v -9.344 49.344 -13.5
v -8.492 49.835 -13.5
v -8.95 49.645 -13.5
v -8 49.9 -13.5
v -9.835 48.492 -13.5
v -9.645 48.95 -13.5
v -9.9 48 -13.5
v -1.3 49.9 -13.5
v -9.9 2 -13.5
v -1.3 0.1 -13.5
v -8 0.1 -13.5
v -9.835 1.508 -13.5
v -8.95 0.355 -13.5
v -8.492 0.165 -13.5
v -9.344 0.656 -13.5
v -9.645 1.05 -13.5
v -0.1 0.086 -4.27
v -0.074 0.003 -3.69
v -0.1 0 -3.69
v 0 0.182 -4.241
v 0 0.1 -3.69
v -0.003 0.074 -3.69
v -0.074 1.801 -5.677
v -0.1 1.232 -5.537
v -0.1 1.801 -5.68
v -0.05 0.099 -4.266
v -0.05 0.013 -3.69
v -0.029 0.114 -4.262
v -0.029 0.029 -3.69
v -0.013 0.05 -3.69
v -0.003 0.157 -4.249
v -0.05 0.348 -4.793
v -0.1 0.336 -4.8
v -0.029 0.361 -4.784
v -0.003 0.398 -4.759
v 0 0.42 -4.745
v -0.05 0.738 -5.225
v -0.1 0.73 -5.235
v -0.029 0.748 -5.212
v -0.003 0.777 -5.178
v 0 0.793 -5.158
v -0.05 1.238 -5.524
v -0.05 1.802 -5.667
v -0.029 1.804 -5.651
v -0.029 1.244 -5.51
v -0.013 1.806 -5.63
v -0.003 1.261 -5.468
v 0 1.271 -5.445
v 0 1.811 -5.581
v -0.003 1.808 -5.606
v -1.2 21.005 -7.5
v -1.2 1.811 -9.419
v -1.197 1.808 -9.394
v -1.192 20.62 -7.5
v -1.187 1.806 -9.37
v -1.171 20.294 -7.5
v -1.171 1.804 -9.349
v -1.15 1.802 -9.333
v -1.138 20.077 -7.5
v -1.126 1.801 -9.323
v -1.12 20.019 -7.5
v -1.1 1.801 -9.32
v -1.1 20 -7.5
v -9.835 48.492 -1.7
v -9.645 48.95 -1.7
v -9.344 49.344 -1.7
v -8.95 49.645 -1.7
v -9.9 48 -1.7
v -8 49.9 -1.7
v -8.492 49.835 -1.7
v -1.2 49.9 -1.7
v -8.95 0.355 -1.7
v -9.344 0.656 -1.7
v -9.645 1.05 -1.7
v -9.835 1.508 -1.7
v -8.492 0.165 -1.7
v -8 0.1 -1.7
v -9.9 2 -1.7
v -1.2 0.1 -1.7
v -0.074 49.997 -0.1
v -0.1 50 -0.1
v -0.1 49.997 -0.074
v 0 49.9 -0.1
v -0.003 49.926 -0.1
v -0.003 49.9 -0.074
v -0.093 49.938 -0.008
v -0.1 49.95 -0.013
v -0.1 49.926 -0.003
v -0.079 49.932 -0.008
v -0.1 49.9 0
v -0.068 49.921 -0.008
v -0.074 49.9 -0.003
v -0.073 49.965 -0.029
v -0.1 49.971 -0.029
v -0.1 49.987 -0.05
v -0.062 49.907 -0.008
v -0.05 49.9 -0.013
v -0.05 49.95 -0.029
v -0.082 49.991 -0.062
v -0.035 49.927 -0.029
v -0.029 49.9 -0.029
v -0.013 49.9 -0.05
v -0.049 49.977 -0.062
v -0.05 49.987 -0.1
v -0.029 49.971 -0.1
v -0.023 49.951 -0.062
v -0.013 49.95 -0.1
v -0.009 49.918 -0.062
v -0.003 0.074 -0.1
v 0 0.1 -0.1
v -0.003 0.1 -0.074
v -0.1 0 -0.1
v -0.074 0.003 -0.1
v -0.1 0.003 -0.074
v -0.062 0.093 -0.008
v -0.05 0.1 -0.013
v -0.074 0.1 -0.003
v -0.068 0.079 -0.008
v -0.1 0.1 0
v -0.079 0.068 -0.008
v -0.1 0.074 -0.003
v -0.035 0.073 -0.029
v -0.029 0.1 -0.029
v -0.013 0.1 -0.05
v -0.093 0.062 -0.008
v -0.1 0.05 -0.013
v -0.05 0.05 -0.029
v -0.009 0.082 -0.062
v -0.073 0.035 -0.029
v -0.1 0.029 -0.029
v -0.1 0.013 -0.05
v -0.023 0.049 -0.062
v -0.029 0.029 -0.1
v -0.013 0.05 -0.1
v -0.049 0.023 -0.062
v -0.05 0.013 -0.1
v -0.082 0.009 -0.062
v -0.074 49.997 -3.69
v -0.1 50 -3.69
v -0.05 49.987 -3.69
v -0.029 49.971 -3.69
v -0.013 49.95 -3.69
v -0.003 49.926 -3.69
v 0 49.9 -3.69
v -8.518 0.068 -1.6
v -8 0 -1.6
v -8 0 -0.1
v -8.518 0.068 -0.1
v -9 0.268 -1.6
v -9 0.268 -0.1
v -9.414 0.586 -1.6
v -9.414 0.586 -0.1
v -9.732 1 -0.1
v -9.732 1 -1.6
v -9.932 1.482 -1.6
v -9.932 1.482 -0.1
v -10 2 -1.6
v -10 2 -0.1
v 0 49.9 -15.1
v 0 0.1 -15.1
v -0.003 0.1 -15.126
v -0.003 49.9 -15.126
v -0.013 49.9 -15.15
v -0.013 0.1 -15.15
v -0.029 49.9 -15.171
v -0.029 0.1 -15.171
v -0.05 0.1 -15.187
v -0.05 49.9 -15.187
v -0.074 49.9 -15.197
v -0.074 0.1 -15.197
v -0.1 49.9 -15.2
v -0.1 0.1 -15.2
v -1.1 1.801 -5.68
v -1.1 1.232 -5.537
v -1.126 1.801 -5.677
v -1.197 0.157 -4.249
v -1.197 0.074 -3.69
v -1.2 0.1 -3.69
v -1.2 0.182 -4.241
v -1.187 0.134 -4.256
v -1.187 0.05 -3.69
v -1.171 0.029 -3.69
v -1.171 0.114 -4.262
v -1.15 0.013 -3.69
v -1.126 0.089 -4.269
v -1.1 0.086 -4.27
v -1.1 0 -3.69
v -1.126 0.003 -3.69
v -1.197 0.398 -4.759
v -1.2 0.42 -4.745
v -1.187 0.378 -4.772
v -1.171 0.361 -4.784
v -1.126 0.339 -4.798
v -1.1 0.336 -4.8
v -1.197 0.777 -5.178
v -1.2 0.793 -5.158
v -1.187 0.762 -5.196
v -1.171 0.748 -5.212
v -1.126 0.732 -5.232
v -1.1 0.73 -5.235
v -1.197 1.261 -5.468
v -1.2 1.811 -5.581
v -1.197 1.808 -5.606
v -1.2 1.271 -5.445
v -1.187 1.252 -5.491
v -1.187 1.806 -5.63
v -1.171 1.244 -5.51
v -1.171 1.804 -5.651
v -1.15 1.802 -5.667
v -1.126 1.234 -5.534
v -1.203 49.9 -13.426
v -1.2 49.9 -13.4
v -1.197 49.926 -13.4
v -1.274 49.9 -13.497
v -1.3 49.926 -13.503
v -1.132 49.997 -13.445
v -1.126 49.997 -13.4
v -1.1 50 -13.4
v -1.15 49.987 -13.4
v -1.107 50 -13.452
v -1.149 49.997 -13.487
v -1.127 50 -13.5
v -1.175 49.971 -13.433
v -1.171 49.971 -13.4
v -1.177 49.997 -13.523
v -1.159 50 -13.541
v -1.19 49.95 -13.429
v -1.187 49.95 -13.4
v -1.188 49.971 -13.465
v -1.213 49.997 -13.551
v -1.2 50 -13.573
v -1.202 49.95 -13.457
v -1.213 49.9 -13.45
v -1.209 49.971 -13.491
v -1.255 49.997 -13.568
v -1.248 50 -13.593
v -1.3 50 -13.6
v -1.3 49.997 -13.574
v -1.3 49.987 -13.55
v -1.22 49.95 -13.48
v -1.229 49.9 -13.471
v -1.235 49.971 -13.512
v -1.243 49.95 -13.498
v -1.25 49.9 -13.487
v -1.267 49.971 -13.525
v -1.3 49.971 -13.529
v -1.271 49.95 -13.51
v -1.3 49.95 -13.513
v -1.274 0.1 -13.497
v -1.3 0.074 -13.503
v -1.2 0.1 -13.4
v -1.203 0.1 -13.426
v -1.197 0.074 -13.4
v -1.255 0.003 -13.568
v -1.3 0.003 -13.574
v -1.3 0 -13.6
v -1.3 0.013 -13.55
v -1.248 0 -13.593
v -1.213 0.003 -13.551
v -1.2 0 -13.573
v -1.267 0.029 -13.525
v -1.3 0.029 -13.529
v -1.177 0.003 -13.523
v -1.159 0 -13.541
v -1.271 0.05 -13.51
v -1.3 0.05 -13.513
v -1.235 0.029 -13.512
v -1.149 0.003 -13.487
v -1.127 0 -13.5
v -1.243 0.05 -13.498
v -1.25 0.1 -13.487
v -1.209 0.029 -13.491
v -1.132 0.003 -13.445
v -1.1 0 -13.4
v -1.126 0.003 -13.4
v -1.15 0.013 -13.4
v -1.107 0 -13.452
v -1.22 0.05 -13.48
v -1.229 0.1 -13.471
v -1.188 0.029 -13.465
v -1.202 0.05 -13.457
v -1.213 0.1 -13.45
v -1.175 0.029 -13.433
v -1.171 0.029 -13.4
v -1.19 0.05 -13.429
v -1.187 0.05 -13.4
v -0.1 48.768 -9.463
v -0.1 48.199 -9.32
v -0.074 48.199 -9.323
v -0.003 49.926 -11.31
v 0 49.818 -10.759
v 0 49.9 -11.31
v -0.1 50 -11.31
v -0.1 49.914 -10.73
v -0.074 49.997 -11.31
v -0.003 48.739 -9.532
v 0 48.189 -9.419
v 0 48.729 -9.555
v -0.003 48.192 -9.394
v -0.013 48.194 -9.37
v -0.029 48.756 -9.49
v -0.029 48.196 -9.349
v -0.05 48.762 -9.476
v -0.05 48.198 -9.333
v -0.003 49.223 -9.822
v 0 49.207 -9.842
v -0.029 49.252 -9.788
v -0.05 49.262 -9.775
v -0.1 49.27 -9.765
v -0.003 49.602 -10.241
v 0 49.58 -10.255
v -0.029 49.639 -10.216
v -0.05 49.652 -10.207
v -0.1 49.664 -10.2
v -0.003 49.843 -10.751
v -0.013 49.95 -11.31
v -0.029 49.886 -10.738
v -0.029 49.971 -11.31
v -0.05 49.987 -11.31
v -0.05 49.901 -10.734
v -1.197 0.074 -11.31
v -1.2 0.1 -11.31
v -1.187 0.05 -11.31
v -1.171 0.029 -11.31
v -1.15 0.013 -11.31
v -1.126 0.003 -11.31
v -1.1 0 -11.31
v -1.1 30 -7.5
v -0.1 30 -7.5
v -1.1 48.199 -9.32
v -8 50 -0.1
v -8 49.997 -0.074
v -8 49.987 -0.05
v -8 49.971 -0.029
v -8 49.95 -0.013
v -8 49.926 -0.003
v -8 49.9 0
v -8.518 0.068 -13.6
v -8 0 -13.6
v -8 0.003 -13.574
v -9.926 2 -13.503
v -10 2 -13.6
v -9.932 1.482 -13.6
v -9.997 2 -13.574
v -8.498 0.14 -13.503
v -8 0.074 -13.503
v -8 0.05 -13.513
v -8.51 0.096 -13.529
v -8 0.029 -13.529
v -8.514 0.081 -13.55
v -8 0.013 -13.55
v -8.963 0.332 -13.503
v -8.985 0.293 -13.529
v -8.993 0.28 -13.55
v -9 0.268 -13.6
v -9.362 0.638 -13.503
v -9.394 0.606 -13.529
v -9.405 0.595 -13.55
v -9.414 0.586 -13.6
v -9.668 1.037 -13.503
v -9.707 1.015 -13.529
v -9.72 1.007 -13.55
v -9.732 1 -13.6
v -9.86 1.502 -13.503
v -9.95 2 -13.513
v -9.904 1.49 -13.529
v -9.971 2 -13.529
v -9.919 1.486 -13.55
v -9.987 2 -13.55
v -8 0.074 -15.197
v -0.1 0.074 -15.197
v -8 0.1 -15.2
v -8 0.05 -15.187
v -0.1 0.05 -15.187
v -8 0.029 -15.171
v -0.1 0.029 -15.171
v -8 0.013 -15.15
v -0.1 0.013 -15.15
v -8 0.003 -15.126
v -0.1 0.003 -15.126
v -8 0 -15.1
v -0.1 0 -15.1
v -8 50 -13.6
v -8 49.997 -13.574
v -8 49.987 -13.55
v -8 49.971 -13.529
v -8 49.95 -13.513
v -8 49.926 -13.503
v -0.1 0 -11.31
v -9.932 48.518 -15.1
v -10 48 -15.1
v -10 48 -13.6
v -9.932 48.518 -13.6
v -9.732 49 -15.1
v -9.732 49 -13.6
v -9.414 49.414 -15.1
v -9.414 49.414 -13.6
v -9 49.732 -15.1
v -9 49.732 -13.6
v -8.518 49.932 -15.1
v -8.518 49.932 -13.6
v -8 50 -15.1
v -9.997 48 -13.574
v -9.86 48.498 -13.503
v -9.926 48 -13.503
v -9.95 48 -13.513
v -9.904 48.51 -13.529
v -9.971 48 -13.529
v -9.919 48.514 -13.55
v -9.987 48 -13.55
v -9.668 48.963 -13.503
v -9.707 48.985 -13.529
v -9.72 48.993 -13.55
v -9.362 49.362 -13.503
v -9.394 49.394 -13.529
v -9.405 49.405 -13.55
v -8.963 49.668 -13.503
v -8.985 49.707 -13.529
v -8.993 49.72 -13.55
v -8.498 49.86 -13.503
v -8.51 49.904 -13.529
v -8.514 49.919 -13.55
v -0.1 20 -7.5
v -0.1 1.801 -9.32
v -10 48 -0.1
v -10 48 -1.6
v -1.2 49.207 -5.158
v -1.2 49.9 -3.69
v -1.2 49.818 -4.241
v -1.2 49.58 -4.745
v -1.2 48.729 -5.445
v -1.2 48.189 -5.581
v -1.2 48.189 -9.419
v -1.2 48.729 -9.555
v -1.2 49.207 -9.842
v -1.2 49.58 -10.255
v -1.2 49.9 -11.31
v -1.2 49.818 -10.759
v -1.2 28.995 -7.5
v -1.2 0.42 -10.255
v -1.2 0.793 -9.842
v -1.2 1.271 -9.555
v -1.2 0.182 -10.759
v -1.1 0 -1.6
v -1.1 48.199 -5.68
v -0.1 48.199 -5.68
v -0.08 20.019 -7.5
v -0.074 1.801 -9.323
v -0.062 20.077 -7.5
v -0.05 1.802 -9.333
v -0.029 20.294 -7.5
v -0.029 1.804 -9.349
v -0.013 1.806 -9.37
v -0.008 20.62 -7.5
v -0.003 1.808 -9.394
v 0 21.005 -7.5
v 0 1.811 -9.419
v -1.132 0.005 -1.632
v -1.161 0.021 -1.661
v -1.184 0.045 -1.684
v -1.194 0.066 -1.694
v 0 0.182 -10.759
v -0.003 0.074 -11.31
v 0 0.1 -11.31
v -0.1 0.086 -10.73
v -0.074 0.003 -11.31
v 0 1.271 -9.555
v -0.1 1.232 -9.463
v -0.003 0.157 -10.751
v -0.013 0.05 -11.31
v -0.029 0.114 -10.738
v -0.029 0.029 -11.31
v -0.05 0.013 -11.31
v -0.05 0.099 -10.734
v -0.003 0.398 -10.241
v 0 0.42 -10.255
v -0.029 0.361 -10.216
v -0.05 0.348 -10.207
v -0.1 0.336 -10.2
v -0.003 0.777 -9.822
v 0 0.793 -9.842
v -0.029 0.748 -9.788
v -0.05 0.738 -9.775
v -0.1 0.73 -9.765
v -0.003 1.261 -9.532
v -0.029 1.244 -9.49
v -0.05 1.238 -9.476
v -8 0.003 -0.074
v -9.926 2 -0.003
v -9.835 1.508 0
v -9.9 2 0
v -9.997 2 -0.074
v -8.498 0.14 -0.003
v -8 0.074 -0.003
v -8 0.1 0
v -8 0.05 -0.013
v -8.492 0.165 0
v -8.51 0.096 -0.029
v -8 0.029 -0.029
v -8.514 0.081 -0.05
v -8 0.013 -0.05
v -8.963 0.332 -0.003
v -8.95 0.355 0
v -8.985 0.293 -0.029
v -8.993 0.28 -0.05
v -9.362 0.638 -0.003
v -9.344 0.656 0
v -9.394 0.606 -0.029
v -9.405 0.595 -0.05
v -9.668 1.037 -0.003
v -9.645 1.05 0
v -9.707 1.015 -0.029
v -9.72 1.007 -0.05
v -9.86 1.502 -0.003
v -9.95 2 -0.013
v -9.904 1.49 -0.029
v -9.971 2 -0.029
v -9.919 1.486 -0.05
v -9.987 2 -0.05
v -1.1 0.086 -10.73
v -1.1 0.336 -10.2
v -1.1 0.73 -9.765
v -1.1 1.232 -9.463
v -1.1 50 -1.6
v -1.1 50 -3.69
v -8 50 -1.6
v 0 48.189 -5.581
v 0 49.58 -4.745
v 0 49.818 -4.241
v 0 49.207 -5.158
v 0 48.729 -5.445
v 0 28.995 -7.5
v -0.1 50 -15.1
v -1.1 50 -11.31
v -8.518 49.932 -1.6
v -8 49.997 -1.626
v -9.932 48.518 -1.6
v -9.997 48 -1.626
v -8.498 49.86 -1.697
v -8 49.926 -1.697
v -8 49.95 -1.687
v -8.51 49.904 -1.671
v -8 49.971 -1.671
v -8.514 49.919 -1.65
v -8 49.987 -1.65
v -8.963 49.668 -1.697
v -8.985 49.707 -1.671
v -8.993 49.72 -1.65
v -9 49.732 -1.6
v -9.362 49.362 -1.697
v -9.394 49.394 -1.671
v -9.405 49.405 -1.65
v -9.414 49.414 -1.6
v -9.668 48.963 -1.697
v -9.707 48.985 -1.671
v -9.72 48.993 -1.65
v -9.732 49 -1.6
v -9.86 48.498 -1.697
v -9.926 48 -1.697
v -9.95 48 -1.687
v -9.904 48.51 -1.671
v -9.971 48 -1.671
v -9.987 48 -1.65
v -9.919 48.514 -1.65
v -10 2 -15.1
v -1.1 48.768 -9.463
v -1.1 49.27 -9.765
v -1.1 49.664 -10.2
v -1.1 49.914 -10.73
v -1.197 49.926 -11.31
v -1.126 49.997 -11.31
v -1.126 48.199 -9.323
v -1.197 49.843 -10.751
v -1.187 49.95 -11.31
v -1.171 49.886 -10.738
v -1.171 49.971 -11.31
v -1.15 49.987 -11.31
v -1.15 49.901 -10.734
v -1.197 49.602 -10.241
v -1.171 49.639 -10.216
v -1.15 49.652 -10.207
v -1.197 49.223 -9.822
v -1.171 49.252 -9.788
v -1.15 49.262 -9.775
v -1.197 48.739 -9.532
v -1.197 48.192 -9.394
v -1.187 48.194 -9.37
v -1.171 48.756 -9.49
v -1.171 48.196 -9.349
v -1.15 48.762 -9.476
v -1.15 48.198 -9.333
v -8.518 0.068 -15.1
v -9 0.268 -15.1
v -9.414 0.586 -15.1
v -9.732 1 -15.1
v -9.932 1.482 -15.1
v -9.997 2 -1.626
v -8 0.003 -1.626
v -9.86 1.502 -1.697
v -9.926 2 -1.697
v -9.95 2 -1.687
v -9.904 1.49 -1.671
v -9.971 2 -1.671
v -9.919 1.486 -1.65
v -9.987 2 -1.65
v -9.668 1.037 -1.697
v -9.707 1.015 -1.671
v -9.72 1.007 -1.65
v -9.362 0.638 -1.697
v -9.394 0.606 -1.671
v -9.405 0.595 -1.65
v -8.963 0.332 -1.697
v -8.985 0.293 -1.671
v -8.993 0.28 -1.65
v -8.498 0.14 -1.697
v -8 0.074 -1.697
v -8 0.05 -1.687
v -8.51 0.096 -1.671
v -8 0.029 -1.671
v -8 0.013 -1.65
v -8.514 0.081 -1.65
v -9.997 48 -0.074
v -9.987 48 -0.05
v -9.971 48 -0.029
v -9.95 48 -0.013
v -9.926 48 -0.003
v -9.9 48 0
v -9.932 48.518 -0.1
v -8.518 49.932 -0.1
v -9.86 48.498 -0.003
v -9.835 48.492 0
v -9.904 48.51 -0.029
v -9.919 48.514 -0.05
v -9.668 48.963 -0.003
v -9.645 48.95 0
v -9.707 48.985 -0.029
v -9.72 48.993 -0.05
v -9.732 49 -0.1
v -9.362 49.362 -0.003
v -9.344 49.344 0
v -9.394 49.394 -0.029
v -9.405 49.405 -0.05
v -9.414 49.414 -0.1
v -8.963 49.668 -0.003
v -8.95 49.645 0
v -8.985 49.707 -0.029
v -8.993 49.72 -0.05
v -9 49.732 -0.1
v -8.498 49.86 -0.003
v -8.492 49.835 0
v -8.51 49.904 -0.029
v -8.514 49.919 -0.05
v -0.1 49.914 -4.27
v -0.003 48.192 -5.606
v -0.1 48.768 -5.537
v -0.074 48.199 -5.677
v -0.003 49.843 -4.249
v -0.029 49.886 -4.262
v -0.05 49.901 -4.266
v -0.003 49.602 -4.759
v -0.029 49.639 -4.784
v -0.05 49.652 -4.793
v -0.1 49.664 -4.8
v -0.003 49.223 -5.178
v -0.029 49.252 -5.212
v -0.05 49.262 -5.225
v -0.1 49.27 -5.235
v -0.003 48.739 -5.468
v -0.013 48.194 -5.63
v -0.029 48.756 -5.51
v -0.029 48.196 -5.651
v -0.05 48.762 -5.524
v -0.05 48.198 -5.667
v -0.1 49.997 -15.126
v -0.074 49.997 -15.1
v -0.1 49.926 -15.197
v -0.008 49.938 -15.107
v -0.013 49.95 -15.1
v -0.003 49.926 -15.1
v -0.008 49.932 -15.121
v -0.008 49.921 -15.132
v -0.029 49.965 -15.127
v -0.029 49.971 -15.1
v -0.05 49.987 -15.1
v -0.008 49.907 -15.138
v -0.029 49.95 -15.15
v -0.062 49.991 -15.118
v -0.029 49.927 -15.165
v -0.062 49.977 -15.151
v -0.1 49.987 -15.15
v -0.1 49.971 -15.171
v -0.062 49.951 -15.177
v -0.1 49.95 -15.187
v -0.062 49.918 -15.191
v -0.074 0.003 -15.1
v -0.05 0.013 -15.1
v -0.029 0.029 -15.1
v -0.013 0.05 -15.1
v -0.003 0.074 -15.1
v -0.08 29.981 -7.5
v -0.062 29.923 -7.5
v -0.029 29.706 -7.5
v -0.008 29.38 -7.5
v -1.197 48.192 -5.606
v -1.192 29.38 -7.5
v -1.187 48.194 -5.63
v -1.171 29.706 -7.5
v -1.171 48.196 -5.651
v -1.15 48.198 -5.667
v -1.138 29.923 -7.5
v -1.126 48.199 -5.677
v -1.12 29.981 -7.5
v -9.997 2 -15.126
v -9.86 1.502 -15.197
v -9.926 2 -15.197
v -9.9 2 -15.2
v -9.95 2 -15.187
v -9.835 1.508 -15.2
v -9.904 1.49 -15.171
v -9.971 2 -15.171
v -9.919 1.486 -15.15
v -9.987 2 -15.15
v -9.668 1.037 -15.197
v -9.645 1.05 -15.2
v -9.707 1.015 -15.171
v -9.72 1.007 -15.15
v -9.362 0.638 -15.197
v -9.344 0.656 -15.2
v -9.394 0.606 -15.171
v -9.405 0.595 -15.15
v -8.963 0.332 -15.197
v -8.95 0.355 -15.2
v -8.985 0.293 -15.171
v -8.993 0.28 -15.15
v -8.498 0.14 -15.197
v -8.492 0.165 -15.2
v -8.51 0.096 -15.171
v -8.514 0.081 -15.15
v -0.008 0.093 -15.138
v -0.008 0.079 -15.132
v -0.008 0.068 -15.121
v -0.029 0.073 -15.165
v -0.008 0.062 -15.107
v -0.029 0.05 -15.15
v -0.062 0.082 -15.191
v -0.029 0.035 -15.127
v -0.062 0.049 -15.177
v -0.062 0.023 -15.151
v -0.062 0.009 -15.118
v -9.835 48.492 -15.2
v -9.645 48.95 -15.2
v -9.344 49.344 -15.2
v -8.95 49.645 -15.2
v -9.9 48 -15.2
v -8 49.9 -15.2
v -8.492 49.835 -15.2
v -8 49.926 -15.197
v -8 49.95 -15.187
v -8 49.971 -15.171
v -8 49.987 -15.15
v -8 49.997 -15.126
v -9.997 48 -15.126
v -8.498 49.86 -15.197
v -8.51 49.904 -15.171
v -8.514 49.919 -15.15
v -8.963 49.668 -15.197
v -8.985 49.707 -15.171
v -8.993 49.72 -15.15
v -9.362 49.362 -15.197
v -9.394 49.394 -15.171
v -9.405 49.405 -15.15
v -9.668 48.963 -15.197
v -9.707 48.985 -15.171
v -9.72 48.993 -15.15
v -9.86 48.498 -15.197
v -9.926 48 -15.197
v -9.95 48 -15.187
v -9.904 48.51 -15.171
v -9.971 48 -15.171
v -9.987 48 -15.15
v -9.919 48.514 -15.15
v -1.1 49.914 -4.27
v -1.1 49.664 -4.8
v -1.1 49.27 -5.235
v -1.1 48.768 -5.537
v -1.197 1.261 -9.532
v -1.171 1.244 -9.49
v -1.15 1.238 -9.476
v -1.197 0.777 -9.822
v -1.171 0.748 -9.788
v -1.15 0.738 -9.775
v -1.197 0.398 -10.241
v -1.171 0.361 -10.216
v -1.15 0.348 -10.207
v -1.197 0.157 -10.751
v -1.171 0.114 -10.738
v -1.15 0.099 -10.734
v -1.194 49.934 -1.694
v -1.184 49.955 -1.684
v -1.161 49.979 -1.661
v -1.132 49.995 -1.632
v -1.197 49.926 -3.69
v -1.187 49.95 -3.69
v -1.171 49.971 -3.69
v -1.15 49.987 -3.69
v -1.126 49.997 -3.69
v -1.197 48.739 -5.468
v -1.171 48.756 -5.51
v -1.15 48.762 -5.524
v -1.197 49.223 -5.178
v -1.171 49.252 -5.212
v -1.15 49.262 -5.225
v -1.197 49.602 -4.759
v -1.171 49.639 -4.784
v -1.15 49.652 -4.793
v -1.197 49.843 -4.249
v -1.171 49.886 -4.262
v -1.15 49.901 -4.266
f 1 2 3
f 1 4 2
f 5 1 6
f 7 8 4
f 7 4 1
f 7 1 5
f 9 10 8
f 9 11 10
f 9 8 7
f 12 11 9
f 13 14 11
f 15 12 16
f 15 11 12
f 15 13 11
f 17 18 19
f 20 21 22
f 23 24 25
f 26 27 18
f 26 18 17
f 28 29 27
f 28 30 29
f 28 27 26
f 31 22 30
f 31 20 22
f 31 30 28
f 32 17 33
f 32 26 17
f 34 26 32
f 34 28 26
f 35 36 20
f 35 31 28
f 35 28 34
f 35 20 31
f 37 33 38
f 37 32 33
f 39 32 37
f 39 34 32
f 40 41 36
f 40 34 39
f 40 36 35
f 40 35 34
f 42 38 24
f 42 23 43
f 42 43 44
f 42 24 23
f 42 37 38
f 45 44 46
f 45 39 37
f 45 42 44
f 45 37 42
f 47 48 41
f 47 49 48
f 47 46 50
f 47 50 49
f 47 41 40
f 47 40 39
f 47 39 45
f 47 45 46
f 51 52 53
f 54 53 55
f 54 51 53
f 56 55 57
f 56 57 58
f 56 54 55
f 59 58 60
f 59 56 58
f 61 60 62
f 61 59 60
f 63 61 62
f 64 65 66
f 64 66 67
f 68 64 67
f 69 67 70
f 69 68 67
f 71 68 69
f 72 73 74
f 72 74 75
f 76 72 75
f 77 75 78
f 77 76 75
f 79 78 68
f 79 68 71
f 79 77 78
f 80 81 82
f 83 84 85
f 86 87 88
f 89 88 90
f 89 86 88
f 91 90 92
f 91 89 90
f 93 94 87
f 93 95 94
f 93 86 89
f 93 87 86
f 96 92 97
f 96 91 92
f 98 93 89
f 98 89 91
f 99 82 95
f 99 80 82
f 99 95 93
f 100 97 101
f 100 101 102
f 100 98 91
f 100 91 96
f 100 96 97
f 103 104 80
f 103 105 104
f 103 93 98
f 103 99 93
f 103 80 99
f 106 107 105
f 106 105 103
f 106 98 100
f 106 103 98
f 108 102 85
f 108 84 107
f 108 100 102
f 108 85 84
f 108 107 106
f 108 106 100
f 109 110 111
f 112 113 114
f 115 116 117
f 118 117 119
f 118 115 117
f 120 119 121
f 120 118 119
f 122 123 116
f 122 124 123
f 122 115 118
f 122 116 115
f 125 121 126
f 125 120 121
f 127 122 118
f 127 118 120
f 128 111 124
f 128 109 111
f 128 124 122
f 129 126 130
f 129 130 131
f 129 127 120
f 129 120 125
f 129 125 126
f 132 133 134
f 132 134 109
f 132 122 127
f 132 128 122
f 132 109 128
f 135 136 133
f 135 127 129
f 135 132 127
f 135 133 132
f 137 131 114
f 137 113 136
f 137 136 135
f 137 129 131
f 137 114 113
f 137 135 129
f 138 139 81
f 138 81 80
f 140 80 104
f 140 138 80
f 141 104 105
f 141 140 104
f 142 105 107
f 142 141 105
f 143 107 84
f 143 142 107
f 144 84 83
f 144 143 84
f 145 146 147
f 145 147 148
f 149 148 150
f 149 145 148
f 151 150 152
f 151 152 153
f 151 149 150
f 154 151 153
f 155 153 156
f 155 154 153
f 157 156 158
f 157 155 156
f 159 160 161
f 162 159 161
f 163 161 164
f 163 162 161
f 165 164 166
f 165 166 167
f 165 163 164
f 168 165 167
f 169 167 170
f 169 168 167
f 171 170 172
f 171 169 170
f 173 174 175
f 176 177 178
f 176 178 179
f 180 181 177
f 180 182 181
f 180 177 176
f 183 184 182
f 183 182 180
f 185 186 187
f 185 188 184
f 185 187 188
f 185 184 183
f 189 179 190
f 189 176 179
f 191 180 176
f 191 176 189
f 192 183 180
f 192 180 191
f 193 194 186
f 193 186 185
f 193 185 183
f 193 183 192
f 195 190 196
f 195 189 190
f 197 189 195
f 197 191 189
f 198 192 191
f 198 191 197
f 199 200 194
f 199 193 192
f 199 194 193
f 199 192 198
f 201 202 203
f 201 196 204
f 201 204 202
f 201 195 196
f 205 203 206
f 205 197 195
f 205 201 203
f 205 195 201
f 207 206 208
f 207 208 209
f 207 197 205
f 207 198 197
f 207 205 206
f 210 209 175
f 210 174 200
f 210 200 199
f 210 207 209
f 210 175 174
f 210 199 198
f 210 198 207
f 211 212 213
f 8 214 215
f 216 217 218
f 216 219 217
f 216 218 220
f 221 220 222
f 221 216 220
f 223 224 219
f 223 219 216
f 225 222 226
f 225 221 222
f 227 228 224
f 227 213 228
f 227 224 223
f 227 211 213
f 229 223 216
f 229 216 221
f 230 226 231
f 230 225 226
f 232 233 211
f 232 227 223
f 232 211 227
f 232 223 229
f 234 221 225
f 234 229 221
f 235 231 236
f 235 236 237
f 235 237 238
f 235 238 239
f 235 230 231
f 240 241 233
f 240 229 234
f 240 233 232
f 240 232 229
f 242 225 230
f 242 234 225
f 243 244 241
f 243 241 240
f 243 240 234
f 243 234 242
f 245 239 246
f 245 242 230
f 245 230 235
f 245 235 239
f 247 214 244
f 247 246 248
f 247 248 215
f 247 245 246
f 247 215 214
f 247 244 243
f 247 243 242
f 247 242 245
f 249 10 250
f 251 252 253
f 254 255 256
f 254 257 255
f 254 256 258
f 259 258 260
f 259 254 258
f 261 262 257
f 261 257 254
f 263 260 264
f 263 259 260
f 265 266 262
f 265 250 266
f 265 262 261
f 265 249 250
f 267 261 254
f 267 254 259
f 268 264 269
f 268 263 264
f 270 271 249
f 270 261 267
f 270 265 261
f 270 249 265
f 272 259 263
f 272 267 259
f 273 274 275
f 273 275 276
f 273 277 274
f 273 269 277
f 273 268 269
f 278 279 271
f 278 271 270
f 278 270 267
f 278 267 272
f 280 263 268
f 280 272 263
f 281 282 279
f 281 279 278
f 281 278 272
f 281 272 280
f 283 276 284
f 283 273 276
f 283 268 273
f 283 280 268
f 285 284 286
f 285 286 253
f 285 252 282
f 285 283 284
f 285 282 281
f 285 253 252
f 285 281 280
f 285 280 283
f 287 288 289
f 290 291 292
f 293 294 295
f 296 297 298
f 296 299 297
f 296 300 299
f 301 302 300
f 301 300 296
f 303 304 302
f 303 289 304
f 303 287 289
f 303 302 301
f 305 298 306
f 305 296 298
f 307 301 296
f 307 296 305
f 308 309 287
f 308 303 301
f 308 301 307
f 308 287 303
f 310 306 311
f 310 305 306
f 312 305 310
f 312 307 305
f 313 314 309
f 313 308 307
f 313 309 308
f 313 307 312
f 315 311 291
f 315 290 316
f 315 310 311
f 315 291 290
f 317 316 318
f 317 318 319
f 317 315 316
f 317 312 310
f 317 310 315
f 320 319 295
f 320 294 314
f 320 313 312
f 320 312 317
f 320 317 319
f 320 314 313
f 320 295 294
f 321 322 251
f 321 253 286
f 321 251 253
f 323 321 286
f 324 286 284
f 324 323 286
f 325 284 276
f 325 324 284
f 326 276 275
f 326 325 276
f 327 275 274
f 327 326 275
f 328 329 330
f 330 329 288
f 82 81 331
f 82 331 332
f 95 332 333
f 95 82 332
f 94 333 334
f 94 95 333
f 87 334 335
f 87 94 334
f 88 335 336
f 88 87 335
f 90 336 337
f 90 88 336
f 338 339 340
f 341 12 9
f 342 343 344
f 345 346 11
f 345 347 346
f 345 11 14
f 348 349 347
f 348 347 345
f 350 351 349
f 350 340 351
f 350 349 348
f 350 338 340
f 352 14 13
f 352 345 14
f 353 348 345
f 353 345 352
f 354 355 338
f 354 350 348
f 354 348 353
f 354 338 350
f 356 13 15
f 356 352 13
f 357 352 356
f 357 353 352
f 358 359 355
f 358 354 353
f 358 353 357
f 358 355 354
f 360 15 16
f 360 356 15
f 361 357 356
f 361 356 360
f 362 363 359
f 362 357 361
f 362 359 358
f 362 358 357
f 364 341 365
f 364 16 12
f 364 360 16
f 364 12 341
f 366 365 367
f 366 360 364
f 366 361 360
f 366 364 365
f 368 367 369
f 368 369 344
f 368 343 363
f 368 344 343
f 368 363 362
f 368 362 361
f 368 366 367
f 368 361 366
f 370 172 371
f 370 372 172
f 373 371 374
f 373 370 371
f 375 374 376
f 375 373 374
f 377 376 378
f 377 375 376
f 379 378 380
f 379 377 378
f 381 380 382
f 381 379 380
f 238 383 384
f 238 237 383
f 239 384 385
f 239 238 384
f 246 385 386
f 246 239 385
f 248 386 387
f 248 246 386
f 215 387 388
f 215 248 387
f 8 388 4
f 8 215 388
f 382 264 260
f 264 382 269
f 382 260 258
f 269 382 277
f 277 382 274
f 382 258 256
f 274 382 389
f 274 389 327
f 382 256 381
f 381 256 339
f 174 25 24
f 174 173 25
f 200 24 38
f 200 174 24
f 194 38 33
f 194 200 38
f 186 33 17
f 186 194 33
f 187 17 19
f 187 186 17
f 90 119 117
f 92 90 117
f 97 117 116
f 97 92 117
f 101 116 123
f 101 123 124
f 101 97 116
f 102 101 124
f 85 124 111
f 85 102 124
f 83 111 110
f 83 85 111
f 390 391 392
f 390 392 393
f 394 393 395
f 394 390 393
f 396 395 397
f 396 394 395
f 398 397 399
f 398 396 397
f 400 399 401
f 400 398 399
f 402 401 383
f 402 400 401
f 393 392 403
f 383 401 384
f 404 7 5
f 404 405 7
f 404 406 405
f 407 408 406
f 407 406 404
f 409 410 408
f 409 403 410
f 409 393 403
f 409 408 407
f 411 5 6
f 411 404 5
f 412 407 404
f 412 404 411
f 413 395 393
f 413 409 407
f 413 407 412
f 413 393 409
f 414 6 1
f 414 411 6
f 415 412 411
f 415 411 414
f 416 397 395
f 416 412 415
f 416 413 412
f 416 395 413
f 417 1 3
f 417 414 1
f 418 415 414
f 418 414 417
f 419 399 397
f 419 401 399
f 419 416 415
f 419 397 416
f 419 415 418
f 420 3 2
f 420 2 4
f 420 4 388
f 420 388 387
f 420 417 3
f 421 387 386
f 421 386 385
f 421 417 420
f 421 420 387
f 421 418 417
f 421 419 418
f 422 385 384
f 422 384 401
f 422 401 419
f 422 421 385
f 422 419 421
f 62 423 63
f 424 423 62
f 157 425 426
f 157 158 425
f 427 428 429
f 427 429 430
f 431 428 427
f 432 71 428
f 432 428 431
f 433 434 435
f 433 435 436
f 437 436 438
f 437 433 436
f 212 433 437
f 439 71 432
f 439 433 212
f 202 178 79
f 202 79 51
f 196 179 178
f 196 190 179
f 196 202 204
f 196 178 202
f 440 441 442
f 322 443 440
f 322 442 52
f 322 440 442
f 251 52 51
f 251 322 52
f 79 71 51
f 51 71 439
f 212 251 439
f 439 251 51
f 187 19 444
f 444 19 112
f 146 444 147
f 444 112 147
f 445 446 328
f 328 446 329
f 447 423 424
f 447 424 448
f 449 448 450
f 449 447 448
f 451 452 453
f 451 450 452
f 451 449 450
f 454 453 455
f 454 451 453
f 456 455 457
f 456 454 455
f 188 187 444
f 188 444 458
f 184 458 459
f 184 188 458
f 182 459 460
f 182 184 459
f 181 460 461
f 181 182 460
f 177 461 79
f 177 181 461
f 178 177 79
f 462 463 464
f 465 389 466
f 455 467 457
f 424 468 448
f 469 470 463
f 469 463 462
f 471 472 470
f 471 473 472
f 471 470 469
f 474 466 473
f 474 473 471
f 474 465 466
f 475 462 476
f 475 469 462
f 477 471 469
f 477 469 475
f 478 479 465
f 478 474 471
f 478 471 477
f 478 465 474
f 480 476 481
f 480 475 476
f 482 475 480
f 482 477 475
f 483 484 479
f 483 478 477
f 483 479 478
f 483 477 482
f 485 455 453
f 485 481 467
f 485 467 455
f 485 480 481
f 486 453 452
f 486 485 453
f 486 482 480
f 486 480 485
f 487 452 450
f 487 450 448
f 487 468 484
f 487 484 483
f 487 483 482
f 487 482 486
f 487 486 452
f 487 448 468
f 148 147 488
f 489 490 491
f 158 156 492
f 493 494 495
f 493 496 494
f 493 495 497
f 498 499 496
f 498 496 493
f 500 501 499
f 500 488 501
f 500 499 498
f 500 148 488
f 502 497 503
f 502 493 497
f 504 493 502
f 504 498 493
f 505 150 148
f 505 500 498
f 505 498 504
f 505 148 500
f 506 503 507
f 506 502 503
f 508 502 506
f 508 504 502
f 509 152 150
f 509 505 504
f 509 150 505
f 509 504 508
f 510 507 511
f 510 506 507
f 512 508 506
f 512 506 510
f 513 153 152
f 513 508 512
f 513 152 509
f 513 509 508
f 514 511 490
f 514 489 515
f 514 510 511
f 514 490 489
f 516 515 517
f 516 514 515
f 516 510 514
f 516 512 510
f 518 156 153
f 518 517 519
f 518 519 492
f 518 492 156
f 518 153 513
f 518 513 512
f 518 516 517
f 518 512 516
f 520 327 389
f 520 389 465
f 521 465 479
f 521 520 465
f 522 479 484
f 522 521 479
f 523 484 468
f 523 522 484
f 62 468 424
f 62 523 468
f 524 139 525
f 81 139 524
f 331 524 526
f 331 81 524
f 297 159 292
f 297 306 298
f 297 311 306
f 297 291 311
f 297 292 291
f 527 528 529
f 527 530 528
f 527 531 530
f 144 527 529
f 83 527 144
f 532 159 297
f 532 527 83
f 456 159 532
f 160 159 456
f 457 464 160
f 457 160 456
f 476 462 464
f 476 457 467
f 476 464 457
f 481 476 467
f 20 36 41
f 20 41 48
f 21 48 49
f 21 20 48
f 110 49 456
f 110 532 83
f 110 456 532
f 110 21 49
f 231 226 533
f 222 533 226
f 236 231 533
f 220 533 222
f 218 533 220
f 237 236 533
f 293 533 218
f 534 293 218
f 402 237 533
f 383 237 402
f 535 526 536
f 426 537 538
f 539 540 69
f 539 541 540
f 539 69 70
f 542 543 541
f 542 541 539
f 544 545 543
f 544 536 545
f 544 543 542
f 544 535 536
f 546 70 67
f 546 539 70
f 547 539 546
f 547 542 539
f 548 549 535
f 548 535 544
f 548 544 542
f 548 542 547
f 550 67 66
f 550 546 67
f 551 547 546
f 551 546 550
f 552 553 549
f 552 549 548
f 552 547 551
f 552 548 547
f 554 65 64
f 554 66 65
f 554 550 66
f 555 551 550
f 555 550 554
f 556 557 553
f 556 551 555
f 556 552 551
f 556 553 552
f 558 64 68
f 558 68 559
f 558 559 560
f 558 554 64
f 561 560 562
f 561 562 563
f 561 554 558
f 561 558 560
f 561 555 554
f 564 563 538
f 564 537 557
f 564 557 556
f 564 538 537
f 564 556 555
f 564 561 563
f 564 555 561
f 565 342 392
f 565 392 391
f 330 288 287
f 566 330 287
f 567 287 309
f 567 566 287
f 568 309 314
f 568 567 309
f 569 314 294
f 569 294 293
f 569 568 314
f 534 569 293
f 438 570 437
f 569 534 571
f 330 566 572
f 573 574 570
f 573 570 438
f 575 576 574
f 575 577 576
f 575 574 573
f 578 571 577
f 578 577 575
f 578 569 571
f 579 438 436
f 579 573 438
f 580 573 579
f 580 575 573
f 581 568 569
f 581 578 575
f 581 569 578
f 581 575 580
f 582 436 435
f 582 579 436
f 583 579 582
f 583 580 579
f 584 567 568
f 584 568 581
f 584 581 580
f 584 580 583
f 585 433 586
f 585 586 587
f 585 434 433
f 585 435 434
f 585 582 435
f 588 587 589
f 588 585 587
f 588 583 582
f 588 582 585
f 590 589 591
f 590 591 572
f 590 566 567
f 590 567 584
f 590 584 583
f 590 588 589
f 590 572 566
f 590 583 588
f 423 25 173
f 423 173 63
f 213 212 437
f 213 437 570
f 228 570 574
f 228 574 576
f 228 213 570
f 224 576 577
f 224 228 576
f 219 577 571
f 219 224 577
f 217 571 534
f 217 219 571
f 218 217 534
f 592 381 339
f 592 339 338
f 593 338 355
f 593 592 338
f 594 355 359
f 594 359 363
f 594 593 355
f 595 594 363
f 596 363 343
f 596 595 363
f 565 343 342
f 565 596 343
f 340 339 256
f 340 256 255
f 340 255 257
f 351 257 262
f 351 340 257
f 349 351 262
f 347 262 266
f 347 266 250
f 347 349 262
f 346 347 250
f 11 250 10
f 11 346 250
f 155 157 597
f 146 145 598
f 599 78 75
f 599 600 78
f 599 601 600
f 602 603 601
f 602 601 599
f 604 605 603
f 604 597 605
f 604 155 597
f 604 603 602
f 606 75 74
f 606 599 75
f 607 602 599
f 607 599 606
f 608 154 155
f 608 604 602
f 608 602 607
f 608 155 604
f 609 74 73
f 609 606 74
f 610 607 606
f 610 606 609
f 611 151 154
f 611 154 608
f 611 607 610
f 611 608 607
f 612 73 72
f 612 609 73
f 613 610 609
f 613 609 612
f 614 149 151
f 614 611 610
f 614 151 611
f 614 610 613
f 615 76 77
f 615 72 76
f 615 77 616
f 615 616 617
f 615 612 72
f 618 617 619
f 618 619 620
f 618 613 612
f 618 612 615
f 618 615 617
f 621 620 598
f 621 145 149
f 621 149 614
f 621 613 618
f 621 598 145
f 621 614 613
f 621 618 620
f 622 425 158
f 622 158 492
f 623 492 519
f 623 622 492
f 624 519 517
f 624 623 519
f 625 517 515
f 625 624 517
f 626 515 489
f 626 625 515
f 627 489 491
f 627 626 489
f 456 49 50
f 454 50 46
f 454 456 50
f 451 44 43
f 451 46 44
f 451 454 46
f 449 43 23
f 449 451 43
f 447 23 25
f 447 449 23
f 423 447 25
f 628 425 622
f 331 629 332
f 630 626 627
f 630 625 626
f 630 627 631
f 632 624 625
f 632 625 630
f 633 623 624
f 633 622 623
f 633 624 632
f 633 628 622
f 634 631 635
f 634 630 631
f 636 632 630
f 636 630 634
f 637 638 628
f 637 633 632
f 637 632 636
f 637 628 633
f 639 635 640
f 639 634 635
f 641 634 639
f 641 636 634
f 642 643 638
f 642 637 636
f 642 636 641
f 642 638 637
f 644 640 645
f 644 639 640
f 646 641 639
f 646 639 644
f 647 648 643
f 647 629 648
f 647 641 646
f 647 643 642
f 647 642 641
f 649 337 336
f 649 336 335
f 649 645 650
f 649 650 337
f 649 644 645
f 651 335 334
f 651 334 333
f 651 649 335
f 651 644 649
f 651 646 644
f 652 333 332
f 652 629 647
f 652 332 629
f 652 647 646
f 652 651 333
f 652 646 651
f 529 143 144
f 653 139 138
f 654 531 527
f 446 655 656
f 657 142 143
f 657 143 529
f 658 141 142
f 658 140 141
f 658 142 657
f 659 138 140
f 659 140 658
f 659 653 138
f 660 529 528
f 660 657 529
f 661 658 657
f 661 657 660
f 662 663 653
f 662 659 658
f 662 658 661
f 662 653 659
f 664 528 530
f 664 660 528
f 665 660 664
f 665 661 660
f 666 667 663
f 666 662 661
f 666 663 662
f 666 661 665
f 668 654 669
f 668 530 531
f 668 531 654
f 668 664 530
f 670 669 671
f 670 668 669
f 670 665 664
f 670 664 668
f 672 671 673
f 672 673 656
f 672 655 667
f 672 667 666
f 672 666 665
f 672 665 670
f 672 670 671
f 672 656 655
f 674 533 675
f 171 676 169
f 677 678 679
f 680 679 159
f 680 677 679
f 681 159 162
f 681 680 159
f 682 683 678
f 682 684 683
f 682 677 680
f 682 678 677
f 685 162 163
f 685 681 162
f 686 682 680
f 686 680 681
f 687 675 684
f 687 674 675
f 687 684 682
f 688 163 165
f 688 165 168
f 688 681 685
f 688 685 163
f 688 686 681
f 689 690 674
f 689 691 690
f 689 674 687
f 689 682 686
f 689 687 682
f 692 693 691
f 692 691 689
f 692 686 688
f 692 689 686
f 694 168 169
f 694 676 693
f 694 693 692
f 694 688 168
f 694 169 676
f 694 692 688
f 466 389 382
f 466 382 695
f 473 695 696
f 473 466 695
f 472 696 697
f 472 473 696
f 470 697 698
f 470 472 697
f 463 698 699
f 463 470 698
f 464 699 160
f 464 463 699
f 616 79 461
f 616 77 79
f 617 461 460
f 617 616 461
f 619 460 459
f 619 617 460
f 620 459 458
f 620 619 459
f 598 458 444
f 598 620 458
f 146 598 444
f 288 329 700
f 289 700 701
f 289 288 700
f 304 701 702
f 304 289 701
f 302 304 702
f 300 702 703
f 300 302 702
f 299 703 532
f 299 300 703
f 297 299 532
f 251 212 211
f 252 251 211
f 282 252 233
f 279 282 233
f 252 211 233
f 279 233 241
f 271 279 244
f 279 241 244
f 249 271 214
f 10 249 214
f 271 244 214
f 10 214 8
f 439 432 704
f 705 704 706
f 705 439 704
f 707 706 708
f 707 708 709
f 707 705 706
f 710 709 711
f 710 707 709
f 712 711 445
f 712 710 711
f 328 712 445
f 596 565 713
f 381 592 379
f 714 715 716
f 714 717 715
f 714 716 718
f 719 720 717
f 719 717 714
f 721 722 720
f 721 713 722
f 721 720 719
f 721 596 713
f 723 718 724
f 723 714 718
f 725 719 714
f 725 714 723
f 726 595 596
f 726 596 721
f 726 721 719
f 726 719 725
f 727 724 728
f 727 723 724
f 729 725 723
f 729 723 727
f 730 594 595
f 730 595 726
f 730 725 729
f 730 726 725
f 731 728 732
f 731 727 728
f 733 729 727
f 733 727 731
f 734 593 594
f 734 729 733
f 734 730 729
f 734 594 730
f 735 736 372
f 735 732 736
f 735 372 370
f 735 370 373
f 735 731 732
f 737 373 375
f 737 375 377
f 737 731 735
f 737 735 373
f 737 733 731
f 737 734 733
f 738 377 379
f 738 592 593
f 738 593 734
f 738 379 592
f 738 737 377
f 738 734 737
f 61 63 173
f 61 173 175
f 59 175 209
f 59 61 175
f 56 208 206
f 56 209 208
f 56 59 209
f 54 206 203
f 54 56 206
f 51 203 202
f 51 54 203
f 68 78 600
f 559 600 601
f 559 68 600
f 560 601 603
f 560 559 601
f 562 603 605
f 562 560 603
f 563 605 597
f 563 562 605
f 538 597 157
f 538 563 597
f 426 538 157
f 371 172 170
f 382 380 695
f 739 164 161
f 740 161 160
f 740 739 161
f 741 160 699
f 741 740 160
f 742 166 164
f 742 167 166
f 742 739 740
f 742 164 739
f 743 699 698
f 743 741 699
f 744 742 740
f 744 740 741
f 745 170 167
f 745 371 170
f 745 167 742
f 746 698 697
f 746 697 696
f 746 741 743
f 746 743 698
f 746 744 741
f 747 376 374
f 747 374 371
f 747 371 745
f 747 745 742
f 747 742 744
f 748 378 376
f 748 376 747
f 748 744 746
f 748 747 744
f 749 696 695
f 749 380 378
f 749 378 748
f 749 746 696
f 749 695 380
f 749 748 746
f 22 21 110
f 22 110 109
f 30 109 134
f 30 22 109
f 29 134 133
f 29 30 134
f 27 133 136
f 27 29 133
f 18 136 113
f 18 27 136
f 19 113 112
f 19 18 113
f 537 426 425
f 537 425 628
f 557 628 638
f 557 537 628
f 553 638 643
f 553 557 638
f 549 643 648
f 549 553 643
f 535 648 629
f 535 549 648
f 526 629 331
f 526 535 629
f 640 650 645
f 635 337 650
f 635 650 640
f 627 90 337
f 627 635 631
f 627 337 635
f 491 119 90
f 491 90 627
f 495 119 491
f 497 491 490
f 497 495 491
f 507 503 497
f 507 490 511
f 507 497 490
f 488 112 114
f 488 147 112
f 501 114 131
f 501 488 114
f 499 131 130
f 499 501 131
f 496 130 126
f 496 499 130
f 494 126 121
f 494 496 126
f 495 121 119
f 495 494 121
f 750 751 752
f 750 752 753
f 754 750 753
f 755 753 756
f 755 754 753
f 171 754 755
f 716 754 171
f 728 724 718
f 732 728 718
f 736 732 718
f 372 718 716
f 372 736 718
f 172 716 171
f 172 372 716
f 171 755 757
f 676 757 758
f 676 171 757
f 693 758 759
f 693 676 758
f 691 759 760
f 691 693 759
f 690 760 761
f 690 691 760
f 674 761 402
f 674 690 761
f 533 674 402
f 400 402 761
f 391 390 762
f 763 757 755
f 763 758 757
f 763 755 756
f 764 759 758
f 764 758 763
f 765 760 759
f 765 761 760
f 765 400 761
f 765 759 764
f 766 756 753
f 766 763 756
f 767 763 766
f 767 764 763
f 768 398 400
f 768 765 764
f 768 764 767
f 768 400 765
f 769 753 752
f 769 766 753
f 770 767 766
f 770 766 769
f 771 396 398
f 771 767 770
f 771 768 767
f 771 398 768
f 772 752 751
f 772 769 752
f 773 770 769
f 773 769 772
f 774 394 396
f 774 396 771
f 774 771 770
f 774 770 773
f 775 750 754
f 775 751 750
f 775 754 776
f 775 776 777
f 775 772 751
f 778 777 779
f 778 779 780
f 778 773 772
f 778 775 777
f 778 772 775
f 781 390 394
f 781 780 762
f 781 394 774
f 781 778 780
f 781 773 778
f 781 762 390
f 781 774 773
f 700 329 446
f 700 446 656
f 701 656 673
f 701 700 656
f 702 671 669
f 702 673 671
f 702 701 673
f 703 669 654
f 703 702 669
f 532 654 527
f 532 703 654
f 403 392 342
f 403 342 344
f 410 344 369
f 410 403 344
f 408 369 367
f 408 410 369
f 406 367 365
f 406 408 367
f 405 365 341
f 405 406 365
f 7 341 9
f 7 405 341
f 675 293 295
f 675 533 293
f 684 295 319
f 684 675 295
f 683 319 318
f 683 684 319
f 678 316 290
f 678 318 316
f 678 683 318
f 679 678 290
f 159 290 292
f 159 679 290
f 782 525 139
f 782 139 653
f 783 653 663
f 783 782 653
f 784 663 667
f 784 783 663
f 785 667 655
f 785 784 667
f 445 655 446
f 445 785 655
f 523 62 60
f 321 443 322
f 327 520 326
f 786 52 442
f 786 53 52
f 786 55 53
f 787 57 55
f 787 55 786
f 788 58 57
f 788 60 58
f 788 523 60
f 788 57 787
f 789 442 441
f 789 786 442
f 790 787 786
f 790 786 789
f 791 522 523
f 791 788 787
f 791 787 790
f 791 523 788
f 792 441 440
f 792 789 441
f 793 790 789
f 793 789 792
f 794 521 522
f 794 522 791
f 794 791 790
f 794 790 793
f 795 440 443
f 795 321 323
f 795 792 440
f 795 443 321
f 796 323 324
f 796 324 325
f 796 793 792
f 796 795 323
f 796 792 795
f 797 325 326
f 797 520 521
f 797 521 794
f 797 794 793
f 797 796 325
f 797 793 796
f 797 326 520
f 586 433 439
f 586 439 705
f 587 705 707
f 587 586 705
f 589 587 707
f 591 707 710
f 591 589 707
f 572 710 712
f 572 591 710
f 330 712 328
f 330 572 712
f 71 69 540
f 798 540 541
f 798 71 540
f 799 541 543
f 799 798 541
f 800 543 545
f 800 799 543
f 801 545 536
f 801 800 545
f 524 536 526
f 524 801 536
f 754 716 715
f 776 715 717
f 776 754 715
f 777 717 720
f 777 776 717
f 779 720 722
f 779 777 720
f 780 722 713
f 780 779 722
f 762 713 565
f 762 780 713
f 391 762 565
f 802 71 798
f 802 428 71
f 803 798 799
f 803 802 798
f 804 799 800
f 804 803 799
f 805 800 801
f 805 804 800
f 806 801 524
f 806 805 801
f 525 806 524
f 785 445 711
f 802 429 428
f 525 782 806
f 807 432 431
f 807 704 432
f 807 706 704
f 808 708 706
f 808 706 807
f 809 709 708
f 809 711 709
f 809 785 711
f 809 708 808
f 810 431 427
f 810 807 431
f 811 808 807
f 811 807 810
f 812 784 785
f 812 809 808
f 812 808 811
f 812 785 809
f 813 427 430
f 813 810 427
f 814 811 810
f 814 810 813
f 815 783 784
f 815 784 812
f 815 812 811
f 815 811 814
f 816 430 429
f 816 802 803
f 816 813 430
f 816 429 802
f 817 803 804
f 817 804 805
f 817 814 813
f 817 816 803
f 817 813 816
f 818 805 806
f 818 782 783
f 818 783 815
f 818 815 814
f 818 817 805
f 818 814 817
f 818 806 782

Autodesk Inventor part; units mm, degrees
ref_plane "YZ Plane" through (0, 0, 0) normal (1, 0, 0) x (0, 1, 0)
ref_plane "XZ Plane" through (0, 0, 0) normal (0, 1, 0) x (-1, 0, 0)
ref_plane "XY Plane" through (0, 0, 0) normal (0, 0, 1) x (1, 0, 0)
sketch "Эскиз2" plane through (0, 0, 0) normal (0, 1, 0) x (-1, 0, 0)
  line L0 (0, 0) -> (10, 0)
  line L1 (10, 0) -> (10, -1.7)
  line L2 (10, -1.7) -> (1.2, -1.7)
  line L3 (1.2, -1.7) -> (1.2, -13.5)
  line L4 (1.2, -13.5) -> (10, -13.5)
  line L5 (10, -13.5) -> (10, -15.2)
  line L6 (10, -15.2) -> (0, -15.2)
  line L7 (0, -15.2) -> (0, 0)
  dimension "d0" = 10
  dimension "d1" = 1.7
  dimension "d4" = 1.7
  dimension "d5" = 1.2
  dimension "d10" = 15.2
extrude "Выдавливание1" add sketch "Эскиз2" along normal blind 50
fillet "Сопряжение1" radius 2 4 edges at (-10, 50, -14.35) (-10, 50, -0.85) (-10, 0, -14.35) (-10, 0, -0.85)
sketch "Эскиз3" plane through (0, 0, 0) normal (1, 0, 0) x (0, 0, -1)
  line L0 (13.5, 0) -> (1.7, 0) projected
  line L1 (5.5, 0) -> (7.5, 20)
  line L2 (7.5, 20) -> (9.5, 0)
  line L3 (9.5, 0) -> (5.5, 0)
  line L4 (13.5, 50) -> (1.7, 50) projected
  line L5 (5.5, 50) -> (7.5, 30)
  line L6 (7.5, 30) -> (9.5, 50)
  line L7 (9.5, 50) -> (5.5, 50)
  line L8 (0, 0) -> (0, 50) projected
  point P0 (7.6, 50)
  point P1 (7.5, 0)
  point P2 (7.5, 50)
  point P3 (9.5, 0)
  dimension "d11" = 20
  dimension "d12" = 20
  dimension "d15" = 0
  dimension "d16" = 0
  dimension "d17" = 7.5
  dimension "d18" = 7.5
  dimension "d19" = 4
  dimension "d20" = 4
extrude "Выдавливание2" cut sketch "Эскиз3" against normal blind 10
fillet "Сопряжение3" radius 2 4 edges at (-0.6, 0, -9.5) (-0.6, 0, -5.5) (-0.6, 50, -5.5) (-0.6, 50, -9.5)
fillet "Сопряжение4" radius 0.1 47 edges at (-9.4142, 49.4142, -15.2) (-4, 50, -15.2) (-9.4142, 0.5858, -15.2) (-4, 0, -15.2) (-10, 25, -15.2) (-9.4142, 49.4142, -13.5) (-4.6, 50, -13.5) (-9.4142, 0.5858, -13.5) (-4.6, 0, -13.5) (-10, 25, -13.5) (-1.2, 25, -13.5) (-1.2, 49.4829, -9.968) (-1.2, 50, -12.405) (-1.2, 39.0995, -8.41) (-1.2, 49.4829, -5.032) (-1.2, 50, -2.695) (-1.2, 39.0995, -6.59) (0, 49.4829, -5.032) (0, 50, -1.845) (0, 39.0995, -6.59) (0, 49.4829, -9.968) (0, 50, -13.255) (0, 39.0995, -8.41) (-1.2, 0.5171, -9.968) (-1.2, 0, -12.405) (-1.2, 10.9005, -8.41) (0, 0.5171, -9.968) (0, 0, -13.255) (0, 10.9005, -8.41) (-1.2, 0.5171, -5.032) (-1.2, 0, -2.695) (-1.2, 10.9005, -6.59) (0, 0.5171, -5.032) (0, 0, -1.845) (0, 10.9005, -6.59) (-9.4142, 49.4142, -1.7) (-4.6, 50, -1.7) (-9.4142, 0.5858, -1.7) (-4.6, 0, -1.7) (-10, 25, -1.7) (-9.4142, 49.4142, 0) (-4, 50, 0) (-9.4142, 0.5858, 0) (-4, 0, 0) (-10, 25, 0) (0, 25, 0) (0, 25, -15.2)
properties part number "Соединитель"
